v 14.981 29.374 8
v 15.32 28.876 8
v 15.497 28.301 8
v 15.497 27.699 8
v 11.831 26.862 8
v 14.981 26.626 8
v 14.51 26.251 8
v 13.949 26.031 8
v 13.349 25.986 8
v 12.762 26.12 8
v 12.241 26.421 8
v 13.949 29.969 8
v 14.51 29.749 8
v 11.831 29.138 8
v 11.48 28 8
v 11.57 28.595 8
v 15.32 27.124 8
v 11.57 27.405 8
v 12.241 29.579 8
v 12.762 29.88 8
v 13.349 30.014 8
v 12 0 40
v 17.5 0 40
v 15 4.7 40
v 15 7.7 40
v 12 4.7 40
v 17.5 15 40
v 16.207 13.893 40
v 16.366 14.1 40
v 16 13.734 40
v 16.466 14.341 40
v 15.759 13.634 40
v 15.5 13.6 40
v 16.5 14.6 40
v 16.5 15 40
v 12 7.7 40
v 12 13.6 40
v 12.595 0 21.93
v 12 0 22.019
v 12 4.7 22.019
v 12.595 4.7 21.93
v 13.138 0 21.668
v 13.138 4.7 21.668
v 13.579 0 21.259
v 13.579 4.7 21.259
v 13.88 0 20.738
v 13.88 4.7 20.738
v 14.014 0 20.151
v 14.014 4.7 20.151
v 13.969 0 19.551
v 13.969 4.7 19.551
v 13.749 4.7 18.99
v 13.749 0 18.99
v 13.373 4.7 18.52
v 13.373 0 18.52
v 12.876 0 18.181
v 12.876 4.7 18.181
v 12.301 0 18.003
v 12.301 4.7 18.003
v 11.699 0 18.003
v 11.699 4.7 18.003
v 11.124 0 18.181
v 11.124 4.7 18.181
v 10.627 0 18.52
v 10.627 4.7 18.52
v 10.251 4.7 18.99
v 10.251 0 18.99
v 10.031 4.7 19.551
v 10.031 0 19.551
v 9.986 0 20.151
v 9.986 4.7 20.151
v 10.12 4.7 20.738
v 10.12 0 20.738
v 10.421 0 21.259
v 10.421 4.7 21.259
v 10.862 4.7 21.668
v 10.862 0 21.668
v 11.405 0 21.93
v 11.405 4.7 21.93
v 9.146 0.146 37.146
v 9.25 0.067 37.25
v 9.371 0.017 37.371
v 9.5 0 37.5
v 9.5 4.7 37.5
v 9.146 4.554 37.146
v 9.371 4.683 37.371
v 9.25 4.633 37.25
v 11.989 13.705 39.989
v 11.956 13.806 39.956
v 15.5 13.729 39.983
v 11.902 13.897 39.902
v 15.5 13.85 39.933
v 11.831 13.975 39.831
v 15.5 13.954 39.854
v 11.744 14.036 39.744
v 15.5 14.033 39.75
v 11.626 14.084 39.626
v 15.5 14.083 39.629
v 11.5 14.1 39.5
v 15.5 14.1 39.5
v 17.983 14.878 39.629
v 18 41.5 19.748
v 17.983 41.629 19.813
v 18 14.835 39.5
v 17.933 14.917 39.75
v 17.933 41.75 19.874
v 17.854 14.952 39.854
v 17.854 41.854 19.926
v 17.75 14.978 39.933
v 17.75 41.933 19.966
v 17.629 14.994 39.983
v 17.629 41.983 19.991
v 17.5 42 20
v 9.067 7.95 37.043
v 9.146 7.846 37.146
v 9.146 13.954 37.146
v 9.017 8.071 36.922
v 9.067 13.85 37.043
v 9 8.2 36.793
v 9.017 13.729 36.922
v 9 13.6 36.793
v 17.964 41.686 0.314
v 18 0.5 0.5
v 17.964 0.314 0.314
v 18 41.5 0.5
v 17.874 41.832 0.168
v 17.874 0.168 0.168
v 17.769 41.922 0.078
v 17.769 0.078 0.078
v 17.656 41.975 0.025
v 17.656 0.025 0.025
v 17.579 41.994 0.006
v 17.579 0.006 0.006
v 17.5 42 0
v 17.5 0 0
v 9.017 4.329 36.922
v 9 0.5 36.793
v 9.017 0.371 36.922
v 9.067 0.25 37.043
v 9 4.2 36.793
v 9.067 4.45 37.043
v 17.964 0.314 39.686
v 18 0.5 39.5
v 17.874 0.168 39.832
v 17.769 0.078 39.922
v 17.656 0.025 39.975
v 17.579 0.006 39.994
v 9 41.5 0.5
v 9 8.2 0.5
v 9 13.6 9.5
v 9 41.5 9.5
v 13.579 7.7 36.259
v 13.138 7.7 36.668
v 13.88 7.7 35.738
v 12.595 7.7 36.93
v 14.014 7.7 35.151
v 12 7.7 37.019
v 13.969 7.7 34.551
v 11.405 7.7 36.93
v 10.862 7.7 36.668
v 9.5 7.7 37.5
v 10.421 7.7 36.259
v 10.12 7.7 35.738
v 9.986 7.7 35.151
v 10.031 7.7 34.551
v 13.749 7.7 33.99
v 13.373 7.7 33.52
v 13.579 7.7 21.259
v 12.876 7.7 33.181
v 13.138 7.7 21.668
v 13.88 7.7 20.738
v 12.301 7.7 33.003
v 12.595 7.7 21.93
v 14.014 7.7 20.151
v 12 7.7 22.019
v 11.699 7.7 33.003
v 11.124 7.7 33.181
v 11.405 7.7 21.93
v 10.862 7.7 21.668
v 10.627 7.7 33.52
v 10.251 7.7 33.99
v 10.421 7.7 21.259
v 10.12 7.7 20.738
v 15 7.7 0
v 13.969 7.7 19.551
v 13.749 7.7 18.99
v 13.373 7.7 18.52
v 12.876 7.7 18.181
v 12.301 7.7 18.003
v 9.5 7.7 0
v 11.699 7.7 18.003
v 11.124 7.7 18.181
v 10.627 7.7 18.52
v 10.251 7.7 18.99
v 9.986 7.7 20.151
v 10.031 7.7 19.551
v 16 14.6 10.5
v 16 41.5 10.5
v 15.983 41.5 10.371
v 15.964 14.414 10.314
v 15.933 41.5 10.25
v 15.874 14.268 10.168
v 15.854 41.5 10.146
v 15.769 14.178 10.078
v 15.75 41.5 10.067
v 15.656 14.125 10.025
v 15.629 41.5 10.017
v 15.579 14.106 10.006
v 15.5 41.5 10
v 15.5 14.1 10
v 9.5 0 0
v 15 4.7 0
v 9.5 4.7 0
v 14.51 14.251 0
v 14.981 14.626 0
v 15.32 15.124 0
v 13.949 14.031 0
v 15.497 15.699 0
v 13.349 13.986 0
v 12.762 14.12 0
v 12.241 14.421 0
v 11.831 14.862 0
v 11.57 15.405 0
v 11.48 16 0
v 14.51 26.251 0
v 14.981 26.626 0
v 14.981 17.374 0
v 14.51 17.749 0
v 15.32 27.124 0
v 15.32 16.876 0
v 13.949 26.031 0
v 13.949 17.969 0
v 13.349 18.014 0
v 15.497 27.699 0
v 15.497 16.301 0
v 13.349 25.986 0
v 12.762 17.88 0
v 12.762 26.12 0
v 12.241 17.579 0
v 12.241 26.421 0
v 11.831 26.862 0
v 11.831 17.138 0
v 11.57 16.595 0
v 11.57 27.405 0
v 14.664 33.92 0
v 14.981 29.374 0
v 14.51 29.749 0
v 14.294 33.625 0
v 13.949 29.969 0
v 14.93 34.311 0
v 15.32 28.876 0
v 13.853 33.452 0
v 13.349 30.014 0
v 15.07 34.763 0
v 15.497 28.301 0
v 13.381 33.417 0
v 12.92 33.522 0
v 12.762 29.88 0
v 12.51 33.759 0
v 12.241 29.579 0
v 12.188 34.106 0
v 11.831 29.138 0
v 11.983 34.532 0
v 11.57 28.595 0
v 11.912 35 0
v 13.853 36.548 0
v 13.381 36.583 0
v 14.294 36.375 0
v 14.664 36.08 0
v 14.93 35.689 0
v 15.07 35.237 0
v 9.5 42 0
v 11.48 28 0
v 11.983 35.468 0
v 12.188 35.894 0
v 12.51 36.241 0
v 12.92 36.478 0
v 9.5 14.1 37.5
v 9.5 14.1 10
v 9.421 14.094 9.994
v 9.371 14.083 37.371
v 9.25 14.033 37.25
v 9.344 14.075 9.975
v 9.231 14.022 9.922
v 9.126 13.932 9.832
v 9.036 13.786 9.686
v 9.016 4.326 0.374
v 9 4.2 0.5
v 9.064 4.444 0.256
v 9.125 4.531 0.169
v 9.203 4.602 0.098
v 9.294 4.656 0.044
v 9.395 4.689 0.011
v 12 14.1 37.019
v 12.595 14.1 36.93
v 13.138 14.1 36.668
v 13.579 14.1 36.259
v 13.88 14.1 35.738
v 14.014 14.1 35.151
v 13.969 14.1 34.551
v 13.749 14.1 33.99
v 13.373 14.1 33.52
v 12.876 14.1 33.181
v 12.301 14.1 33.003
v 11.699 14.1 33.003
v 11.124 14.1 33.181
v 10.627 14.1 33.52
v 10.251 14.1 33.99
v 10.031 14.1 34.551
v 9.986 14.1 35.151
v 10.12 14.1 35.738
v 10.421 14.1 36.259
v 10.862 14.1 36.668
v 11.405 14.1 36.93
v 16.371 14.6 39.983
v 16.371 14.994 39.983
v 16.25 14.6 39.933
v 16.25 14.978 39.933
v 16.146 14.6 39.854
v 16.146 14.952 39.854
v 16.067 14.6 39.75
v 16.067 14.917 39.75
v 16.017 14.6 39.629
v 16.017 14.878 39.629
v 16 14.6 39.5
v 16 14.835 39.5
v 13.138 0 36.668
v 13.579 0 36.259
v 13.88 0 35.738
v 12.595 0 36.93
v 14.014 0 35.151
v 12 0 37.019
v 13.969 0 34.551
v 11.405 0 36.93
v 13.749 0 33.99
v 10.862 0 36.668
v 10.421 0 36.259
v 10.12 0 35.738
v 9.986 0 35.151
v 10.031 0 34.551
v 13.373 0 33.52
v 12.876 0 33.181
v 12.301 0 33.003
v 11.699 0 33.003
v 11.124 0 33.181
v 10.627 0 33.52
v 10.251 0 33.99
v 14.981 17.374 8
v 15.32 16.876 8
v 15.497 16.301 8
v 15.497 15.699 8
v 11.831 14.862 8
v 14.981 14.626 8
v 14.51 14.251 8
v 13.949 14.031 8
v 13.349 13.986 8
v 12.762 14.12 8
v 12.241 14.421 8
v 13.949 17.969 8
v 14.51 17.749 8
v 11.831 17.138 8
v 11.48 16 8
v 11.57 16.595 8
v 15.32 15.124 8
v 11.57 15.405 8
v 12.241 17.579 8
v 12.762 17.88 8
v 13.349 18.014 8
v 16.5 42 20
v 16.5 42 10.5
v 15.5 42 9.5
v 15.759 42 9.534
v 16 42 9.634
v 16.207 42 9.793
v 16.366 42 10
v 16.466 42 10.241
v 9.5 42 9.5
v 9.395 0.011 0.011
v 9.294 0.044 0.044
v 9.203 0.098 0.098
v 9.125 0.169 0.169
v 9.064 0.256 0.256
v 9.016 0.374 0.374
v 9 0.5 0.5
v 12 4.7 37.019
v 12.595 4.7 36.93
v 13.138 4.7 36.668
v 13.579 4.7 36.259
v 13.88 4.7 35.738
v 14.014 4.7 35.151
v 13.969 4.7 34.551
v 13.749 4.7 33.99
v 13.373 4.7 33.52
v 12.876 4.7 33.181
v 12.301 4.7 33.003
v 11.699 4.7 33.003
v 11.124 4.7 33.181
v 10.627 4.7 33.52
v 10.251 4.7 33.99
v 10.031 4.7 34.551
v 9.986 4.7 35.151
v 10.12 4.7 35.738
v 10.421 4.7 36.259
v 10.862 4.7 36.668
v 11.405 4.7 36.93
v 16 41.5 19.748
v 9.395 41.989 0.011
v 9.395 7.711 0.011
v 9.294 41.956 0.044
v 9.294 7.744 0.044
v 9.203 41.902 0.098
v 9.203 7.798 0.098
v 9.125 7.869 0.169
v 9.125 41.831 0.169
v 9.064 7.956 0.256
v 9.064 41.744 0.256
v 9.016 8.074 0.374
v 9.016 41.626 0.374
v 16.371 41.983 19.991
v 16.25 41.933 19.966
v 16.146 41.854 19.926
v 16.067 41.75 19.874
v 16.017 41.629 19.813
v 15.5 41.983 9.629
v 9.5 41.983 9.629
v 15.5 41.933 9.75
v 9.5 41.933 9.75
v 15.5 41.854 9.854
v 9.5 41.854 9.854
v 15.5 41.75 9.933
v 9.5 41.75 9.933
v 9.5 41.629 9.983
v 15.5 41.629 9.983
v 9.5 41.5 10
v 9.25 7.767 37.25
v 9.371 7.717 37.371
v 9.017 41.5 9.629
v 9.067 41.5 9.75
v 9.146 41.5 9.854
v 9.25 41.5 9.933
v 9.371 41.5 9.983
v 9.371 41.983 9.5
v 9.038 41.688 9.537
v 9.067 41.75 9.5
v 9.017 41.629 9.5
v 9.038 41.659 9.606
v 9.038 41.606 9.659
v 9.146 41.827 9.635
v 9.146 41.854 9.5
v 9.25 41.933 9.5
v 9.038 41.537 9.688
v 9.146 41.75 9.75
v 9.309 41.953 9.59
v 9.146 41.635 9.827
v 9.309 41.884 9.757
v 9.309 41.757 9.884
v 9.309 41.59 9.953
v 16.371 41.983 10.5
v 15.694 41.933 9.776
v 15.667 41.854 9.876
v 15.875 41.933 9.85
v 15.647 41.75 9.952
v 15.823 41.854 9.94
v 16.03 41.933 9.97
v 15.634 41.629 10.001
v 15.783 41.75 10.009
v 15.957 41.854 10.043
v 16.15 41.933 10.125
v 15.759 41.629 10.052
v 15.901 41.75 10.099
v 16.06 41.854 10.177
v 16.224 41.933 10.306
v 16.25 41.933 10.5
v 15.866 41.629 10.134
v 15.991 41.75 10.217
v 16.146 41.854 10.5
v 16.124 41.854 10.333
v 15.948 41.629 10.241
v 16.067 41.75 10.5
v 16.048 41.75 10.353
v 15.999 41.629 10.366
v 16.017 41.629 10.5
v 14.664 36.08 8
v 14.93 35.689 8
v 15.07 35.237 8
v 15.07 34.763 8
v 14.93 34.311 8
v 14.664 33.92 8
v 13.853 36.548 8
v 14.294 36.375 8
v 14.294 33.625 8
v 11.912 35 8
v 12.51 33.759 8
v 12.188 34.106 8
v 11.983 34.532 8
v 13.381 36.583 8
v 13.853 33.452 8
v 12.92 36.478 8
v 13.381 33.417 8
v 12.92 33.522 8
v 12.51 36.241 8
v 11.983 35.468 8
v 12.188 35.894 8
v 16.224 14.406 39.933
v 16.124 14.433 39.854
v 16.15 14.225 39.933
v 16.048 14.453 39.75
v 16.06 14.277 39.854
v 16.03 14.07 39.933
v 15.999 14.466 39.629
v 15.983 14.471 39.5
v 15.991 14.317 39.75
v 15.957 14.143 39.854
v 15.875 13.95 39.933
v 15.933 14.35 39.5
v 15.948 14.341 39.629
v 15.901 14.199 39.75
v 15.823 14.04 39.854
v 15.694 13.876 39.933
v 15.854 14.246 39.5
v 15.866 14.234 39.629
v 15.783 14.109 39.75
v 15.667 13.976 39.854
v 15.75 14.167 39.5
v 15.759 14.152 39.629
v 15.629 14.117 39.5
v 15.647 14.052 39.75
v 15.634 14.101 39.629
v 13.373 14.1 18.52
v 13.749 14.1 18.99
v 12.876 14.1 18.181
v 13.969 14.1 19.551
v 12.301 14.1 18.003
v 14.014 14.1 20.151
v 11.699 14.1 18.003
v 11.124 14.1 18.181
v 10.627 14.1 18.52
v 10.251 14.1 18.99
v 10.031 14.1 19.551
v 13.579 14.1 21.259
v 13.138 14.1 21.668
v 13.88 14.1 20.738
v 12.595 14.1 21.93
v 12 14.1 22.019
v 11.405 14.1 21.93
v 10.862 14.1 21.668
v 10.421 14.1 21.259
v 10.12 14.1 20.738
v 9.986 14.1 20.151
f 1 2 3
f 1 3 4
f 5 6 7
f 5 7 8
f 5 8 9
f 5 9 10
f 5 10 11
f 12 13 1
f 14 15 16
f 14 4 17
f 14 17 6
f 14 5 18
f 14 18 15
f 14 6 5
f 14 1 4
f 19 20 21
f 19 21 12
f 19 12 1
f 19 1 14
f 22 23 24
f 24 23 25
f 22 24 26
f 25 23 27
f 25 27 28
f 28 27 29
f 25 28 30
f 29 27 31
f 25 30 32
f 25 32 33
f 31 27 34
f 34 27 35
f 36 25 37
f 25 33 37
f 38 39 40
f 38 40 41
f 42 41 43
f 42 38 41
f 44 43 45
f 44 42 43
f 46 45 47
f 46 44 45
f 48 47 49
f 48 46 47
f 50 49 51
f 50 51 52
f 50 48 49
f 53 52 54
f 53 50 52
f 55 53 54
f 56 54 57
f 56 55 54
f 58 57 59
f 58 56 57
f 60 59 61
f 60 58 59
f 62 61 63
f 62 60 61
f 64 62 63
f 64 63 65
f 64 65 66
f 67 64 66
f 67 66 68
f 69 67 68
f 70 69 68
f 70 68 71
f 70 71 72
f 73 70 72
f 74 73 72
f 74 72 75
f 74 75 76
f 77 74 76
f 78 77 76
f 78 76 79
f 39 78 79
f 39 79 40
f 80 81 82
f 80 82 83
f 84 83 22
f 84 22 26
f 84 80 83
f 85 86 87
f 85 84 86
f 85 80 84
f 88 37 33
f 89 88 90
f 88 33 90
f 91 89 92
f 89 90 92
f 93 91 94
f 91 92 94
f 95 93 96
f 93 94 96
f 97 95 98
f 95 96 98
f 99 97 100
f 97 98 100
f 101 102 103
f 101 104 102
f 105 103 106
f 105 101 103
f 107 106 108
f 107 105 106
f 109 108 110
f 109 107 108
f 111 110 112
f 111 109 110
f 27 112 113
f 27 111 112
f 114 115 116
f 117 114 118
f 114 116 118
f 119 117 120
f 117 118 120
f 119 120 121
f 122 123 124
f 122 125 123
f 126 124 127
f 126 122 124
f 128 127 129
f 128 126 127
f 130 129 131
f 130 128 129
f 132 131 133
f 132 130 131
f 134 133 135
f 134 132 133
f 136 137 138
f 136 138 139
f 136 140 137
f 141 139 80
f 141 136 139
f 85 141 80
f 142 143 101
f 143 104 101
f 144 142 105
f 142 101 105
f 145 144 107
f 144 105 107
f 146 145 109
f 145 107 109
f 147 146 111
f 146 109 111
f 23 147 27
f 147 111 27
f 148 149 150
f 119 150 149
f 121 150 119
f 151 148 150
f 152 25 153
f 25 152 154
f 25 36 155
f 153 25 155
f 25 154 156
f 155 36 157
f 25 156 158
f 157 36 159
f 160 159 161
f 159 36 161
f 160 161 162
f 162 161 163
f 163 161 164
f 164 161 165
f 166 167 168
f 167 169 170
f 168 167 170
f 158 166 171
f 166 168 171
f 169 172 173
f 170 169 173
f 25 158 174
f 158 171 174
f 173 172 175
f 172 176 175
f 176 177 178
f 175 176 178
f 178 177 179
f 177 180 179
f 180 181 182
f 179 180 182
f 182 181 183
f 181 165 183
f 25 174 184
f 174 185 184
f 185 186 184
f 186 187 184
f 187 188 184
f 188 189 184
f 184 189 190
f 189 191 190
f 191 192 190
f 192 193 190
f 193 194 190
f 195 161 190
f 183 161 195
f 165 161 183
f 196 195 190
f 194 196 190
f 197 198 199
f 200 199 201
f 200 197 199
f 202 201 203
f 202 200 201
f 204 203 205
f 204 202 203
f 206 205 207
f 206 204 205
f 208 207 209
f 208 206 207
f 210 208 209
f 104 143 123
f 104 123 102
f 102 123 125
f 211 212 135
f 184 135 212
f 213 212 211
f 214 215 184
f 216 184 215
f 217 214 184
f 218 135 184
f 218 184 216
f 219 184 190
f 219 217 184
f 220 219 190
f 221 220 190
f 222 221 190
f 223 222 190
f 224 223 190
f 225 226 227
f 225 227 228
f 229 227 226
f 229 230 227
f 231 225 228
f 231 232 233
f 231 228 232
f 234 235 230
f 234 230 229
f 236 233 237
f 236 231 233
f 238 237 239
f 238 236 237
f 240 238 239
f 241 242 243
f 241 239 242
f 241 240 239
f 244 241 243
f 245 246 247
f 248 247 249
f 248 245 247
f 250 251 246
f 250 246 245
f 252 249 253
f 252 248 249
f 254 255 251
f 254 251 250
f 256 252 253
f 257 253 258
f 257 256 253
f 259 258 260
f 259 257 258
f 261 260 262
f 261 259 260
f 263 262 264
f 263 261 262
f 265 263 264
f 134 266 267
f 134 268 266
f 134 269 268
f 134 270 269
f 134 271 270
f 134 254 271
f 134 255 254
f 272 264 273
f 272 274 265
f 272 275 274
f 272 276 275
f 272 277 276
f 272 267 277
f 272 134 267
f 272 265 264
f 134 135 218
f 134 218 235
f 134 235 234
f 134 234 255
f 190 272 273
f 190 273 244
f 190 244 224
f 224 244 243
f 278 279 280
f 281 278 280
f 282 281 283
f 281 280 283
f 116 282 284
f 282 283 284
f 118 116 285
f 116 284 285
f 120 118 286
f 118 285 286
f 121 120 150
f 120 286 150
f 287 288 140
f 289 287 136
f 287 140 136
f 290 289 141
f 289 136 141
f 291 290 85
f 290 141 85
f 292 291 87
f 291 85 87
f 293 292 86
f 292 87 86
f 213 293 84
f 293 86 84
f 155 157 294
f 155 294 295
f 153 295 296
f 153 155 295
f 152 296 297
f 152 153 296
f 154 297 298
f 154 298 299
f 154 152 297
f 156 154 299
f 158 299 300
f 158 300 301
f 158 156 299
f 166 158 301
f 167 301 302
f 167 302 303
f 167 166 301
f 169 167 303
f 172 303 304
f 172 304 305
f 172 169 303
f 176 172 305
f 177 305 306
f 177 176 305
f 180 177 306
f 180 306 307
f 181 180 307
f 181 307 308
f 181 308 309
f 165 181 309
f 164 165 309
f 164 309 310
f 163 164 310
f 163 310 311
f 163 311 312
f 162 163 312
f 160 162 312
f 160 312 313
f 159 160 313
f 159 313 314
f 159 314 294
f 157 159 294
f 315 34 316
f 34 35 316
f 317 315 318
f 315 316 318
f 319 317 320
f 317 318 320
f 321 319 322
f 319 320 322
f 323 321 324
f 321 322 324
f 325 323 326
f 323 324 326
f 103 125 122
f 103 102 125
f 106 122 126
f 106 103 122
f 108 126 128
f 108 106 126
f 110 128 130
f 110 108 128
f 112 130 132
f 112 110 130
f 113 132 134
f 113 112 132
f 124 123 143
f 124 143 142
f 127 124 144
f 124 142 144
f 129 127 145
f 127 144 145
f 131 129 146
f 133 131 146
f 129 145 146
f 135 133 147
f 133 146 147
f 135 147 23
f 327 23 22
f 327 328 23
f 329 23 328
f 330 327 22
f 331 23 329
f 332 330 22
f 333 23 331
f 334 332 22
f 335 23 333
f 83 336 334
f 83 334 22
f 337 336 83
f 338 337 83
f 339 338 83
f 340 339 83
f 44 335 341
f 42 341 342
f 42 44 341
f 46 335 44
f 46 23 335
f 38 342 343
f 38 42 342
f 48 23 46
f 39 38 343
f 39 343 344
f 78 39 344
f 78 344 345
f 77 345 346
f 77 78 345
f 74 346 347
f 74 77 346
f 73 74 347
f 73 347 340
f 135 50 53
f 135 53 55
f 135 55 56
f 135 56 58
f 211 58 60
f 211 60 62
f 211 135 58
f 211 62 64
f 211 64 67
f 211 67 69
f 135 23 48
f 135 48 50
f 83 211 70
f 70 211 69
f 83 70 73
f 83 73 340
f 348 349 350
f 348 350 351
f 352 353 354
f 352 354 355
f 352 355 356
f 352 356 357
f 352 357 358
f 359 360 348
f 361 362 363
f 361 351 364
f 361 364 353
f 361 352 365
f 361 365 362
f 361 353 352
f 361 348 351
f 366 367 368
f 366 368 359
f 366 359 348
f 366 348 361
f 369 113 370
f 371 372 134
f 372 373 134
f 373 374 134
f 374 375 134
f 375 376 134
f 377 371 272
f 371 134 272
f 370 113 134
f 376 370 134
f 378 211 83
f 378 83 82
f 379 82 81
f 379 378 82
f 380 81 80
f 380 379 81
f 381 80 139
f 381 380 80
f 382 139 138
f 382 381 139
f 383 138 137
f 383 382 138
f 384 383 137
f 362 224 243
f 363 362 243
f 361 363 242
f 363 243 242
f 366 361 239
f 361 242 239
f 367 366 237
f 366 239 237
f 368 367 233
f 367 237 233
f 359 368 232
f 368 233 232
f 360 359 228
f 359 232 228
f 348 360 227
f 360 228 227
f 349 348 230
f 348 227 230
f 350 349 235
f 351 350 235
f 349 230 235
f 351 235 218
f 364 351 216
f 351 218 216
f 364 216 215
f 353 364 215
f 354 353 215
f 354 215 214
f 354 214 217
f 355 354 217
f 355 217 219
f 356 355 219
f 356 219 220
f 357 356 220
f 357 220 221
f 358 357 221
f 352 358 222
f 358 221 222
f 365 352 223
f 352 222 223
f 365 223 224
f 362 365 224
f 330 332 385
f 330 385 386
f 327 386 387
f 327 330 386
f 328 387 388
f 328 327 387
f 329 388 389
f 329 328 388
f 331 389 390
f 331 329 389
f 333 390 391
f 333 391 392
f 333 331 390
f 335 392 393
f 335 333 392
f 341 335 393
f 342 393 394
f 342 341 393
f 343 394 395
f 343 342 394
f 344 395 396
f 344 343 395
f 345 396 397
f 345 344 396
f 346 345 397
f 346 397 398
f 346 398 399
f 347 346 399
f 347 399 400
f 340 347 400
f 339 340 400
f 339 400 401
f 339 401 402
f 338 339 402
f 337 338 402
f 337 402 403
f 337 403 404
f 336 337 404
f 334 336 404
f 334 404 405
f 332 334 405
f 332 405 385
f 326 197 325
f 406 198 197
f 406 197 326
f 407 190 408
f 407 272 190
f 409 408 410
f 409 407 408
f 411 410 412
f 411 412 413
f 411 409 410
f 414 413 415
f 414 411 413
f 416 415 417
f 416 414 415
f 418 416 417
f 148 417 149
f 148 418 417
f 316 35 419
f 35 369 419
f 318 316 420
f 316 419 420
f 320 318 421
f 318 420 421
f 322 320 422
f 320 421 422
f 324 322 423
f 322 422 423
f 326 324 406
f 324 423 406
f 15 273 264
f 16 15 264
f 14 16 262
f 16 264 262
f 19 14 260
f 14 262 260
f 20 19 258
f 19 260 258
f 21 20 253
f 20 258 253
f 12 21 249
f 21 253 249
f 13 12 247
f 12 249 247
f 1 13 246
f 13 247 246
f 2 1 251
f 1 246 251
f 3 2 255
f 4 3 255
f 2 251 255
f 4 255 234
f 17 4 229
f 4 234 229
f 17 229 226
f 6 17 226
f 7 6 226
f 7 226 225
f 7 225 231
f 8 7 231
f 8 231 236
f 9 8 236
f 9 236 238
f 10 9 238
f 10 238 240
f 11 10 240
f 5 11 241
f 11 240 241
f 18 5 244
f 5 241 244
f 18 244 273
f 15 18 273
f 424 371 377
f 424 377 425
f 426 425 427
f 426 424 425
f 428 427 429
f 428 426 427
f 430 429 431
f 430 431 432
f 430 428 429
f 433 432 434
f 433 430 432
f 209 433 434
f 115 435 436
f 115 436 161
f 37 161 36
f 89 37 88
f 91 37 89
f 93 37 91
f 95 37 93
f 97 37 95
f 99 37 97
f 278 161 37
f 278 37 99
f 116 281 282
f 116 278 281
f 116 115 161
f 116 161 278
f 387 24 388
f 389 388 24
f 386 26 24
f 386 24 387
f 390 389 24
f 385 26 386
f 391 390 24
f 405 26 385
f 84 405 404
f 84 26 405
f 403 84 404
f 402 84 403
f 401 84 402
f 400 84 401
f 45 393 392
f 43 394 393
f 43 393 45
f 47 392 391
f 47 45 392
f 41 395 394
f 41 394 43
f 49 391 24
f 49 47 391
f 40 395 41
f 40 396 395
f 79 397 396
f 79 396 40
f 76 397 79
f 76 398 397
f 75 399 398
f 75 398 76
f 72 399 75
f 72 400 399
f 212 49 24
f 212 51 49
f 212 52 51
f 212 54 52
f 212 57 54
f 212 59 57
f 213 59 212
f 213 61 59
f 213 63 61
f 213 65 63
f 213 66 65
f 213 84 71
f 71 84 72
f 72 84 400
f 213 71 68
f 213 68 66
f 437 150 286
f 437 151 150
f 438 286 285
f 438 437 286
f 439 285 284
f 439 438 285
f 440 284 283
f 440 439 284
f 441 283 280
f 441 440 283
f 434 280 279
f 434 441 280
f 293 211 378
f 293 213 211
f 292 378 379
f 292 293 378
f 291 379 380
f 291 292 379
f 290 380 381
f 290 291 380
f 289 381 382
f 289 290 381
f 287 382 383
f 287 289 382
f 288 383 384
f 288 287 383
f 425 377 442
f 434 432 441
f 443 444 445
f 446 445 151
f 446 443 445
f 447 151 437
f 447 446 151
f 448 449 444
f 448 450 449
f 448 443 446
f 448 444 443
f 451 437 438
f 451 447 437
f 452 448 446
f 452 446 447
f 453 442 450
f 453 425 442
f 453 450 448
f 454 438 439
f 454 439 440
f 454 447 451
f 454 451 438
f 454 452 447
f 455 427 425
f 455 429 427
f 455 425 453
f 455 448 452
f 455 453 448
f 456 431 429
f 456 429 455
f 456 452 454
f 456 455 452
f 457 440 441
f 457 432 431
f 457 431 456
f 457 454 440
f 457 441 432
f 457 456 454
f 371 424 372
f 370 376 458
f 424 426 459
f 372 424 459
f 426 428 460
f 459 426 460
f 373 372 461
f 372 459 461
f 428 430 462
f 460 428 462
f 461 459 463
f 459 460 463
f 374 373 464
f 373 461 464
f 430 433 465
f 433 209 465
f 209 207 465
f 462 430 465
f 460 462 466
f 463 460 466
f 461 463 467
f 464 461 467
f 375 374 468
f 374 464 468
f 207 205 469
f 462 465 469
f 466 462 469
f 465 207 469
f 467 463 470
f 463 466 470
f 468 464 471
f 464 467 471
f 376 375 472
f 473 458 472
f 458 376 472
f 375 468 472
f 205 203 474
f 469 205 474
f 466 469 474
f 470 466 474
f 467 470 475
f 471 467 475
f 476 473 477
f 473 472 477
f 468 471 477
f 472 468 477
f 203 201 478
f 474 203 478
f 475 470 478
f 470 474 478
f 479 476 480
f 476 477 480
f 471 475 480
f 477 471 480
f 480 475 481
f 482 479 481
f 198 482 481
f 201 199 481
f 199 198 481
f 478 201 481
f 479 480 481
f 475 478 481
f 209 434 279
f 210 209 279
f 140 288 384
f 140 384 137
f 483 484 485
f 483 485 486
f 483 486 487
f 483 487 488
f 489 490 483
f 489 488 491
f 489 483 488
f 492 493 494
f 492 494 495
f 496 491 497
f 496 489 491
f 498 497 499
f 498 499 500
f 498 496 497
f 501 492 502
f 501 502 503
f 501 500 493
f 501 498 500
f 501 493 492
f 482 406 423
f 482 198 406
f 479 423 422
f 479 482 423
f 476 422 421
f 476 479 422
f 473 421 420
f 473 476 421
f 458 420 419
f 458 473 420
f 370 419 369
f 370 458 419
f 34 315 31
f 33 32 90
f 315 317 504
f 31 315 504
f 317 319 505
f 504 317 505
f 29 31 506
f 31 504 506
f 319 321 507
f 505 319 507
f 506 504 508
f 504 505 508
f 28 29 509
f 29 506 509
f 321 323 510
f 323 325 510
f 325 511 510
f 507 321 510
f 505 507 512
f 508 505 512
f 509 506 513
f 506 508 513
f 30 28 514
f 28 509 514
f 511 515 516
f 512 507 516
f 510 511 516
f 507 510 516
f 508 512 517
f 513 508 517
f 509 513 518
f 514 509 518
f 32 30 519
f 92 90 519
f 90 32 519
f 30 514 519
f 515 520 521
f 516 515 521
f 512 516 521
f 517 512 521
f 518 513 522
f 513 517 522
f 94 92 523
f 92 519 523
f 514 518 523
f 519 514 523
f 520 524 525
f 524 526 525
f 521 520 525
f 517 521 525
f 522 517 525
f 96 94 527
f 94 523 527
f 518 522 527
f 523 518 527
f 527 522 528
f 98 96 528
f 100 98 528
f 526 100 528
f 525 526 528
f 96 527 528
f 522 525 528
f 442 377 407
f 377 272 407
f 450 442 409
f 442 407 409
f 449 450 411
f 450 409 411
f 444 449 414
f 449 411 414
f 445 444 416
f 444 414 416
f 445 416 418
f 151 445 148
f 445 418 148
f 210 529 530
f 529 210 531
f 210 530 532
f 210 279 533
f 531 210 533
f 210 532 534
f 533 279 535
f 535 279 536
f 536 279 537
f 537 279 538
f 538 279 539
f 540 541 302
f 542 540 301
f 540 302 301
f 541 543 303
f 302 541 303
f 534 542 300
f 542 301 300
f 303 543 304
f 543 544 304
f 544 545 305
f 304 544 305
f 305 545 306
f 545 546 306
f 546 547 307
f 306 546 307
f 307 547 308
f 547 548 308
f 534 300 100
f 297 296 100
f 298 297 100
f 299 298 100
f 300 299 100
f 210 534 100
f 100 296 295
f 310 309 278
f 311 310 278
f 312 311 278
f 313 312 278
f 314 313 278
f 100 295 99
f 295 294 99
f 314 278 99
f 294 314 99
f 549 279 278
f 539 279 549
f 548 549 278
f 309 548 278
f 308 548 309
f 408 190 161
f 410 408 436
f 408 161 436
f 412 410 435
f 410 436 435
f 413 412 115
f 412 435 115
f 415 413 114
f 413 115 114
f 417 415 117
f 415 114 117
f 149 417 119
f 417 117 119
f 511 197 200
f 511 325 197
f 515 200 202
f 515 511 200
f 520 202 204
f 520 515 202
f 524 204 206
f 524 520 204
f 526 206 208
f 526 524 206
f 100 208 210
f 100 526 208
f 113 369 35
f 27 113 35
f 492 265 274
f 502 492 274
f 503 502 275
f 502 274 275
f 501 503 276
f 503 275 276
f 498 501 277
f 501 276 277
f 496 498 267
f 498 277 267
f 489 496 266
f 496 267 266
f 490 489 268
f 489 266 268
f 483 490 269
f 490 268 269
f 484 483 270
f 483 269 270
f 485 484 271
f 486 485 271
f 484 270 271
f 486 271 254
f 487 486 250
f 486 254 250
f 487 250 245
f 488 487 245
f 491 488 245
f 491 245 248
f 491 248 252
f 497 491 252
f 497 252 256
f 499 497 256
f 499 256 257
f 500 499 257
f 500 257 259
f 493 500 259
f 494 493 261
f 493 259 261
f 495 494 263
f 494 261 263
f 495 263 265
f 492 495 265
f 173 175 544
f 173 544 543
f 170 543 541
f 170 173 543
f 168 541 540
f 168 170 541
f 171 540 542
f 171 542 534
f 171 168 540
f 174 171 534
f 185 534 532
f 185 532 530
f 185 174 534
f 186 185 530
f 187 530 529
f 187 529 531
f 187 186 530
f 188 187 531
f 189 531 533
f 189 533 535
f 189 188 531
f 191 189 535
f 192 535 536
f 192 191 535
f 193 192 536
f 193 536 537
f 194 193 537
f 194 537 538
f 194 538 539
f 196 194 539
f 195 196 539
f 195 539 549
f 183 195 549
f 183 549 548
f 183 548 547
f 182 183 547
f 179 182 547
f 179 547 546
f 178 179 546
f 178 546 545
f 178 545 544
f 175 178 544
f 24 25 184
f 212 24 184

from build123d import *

# Parameters (mm, degrees)
SKETCH1_W           = 9
SKETCH1_H           = 42
SKETCH1_R           = 2.02
SKETCH1_R_2         = 1.5875
BOSS_EXTRUDE1_DEPTH = 40
SKETCH1_3_R         = 2.02
SKETCH1_3_R_2       = 1.5875
CUT_EXTRUDE1_DEPTH  = 8
SKETCH2_W           = 40
SKETCH2_H           = 3
CUT_EXTRUDE2_DEPTH  = 6
CUT_EXTRUDE3_DEPTH  = 9
CUT_EXTRUDE6_DEPTH  = 7
SKETCH6_R           = 2.0193
CUT_EXTRUDE5_DEPTH  = 20
FILLET2_R           = 0.5
CHAMFER4_SIZE       = 3
SKETCH7_W           = 74.310151154
SKETCH7_H           = 95.165931092
CUT_EXTRUDE7_DEPTH  = 9
FILLET3_R           = 0.5


with BuildPart() as part:
    # Sketch1 → Boss-Extrude1 (new body)
    # profile 1 of 4: a face of its own
    with BuildSketch(Plane.XY):
        with Locations((4.5, 21)):
            Rectangle(SKETCH1_W, SKETCH1_H)
        with Locations((4.5, 16)):
            Circle(SKETCH1_R, mode=Mode.SUBTRACT)
        with Locations((4.5, 28)):
            Circle(SKETCH1_R, mode=Mode.SUBTRACT)
    # profile 2 of 4: a face of its own
    with BuildSketch(Plane.XY):
        with Locations((4.5, 28)):
            Circle(SKETCH1_R)
    # profile 3 of 4: a face of its own
    with BuildSketch(Plane.XY):
        with Locations((4.5, 16)):
            Circle(SKETCH1_R)
    # profile 4 of 4: a face of its own
    with BuildSketch(Plane.XY):
        with Locations((4.5, 35)):
            Circle(SKETCH1_R_2)
    extrude(amount=BOSS_EXTRUDE1_DEPTH)

    # Sketch1<3> → Cut-Extrude1 (cut)
    with BuildSketch(Plane.XY):
        with Locations((4.5, 28)):
            Circle(SKETCH1_3_R)
        with Locations((4.5, 35)):
            Circle(SKETCH1_3_R_2)
        with Locations((4.5, 16)):
            Circle(SKETCH1_3_R)
    extrude(amount=CUT_EXTRUDE1_DEPTH, mode=Mode.SUBTRACT)

    # Sketch2 → Cut-Extrude2 (cut)
    with BuildSketch(Plane(origin=(9, 0, 0), x_dir=(0, 0, -1), z_dir=(1, 0, 0))):
        with Locations((-20, 6.2)):
            Rectangle(SKETCH2_W, SKETCH2_H)
    extrude(amount=-CUT_EXTRUDE2_DEPTH, mode=Mode.SUBTRACT)

    # Sketch3 → Cut-Extrude3 (cut)
    with BuildSketch(Plane(origin=(9, 0, 0), x_dir=(0, 0, -1), z_dir=(1, 0, 0))):
        Polygon((-20, 42), (-40, 15), (-48.379363257, 51.913157268), align=None)
    extrude(amount=-CUT_EXTRUDE3_DEPTH, mode=Mode.SUBTRACT)

    # Sketch5 → Cut-Extrude6 (cut)
    with BuildSketch(Plane.ZY.offset(-9)):
        Polygon((20, 42), (10, 42), (10, 14.1), (40, 14.1), (40, 15), align=None)
    extrude(amount=CUT_EXTRUDE6_DEPTH, mode=Mode.SUBTRACT)

    # Sketch6 → Cut-Extrude5 (cut)
    with BuildSketch(Plane.XZ):
        with Locations(Location((6, 35, 0), (0, 0, 90))):
            Circle(SKETCH6_R)
        with Locations(Location((6, 20, 0), (0, 0, 90))):
            Circle(SKETCH6_R)
    extrude(amount=-CUT_EXTRUDE5_DEPTH, mode=Mode.SUBTRACT)

    # Fillet2
    fillet2_edges = [part.edges().sort_by_distance(p)[0] for p in [
        (0, 0, 20),
        (0, 7.5, 40),
        (0, 42, 10),
        (0, 28.5, 30),
        (0, 21, 0),
    ]]
    fillet(fillet2_edges, radius=FILLET2_R)

    # Chamfer4
    chamfer4_edges = [part.edges().sort_by_distance(p)[0] for p in [
        (9, 2.35, 40),
        (9, 10.9, 40),
    ]]
    chamfer(chamfer4_edges, length=CHAMFER4_SIZE)

    # Mirror1: part across plane


with BuildPart() as part_1:
    add(part.part)
    add(part.part.mirror(Plane(origin=(9, 0, 40), x_dir=(0, 0, 1), z_dir=(-1, 0, 0))))

    # Sketch7 → Cut-Extrude7 (cut)
    with BuildSketch(Plane.ZY):
        with Locations((29.906214843, 26.493385896)):
            Rectangle(SKETCH7_W, SKETCH7_H)
    extrude(amount=-CUT_EXTRUDE7_DEPTH, mode=Mode.SUBTRACT)

    # Fillet3
    fillet3_edges = [part_1.edges().sort_by_distance(p)[0] for p in [
        (16, 42, 15),
        (16, 14.55, 40),
        (14, 14.1, 40),
        (16, 28.5, 30),
        (16, 14.1, 25),
        (16, 28.05, 10),
        (9, 2.35, 37),
        (9, 10.9, 37),
        (12.5, 42, 10),
        (9, 2.35, 0),
        (9, 0, 18.5),
        (9, 4.7, 18.5),
        (9, 24.85, 0),
        (9, 7.7, 18.5),
        (9, 42, 5),
        (9, 28.05, 10),
        (9, 14.1, 23.5),
    ]]
    fillet(fillet3_edges, radius=FILLET3_R)


solid = part_1.part
